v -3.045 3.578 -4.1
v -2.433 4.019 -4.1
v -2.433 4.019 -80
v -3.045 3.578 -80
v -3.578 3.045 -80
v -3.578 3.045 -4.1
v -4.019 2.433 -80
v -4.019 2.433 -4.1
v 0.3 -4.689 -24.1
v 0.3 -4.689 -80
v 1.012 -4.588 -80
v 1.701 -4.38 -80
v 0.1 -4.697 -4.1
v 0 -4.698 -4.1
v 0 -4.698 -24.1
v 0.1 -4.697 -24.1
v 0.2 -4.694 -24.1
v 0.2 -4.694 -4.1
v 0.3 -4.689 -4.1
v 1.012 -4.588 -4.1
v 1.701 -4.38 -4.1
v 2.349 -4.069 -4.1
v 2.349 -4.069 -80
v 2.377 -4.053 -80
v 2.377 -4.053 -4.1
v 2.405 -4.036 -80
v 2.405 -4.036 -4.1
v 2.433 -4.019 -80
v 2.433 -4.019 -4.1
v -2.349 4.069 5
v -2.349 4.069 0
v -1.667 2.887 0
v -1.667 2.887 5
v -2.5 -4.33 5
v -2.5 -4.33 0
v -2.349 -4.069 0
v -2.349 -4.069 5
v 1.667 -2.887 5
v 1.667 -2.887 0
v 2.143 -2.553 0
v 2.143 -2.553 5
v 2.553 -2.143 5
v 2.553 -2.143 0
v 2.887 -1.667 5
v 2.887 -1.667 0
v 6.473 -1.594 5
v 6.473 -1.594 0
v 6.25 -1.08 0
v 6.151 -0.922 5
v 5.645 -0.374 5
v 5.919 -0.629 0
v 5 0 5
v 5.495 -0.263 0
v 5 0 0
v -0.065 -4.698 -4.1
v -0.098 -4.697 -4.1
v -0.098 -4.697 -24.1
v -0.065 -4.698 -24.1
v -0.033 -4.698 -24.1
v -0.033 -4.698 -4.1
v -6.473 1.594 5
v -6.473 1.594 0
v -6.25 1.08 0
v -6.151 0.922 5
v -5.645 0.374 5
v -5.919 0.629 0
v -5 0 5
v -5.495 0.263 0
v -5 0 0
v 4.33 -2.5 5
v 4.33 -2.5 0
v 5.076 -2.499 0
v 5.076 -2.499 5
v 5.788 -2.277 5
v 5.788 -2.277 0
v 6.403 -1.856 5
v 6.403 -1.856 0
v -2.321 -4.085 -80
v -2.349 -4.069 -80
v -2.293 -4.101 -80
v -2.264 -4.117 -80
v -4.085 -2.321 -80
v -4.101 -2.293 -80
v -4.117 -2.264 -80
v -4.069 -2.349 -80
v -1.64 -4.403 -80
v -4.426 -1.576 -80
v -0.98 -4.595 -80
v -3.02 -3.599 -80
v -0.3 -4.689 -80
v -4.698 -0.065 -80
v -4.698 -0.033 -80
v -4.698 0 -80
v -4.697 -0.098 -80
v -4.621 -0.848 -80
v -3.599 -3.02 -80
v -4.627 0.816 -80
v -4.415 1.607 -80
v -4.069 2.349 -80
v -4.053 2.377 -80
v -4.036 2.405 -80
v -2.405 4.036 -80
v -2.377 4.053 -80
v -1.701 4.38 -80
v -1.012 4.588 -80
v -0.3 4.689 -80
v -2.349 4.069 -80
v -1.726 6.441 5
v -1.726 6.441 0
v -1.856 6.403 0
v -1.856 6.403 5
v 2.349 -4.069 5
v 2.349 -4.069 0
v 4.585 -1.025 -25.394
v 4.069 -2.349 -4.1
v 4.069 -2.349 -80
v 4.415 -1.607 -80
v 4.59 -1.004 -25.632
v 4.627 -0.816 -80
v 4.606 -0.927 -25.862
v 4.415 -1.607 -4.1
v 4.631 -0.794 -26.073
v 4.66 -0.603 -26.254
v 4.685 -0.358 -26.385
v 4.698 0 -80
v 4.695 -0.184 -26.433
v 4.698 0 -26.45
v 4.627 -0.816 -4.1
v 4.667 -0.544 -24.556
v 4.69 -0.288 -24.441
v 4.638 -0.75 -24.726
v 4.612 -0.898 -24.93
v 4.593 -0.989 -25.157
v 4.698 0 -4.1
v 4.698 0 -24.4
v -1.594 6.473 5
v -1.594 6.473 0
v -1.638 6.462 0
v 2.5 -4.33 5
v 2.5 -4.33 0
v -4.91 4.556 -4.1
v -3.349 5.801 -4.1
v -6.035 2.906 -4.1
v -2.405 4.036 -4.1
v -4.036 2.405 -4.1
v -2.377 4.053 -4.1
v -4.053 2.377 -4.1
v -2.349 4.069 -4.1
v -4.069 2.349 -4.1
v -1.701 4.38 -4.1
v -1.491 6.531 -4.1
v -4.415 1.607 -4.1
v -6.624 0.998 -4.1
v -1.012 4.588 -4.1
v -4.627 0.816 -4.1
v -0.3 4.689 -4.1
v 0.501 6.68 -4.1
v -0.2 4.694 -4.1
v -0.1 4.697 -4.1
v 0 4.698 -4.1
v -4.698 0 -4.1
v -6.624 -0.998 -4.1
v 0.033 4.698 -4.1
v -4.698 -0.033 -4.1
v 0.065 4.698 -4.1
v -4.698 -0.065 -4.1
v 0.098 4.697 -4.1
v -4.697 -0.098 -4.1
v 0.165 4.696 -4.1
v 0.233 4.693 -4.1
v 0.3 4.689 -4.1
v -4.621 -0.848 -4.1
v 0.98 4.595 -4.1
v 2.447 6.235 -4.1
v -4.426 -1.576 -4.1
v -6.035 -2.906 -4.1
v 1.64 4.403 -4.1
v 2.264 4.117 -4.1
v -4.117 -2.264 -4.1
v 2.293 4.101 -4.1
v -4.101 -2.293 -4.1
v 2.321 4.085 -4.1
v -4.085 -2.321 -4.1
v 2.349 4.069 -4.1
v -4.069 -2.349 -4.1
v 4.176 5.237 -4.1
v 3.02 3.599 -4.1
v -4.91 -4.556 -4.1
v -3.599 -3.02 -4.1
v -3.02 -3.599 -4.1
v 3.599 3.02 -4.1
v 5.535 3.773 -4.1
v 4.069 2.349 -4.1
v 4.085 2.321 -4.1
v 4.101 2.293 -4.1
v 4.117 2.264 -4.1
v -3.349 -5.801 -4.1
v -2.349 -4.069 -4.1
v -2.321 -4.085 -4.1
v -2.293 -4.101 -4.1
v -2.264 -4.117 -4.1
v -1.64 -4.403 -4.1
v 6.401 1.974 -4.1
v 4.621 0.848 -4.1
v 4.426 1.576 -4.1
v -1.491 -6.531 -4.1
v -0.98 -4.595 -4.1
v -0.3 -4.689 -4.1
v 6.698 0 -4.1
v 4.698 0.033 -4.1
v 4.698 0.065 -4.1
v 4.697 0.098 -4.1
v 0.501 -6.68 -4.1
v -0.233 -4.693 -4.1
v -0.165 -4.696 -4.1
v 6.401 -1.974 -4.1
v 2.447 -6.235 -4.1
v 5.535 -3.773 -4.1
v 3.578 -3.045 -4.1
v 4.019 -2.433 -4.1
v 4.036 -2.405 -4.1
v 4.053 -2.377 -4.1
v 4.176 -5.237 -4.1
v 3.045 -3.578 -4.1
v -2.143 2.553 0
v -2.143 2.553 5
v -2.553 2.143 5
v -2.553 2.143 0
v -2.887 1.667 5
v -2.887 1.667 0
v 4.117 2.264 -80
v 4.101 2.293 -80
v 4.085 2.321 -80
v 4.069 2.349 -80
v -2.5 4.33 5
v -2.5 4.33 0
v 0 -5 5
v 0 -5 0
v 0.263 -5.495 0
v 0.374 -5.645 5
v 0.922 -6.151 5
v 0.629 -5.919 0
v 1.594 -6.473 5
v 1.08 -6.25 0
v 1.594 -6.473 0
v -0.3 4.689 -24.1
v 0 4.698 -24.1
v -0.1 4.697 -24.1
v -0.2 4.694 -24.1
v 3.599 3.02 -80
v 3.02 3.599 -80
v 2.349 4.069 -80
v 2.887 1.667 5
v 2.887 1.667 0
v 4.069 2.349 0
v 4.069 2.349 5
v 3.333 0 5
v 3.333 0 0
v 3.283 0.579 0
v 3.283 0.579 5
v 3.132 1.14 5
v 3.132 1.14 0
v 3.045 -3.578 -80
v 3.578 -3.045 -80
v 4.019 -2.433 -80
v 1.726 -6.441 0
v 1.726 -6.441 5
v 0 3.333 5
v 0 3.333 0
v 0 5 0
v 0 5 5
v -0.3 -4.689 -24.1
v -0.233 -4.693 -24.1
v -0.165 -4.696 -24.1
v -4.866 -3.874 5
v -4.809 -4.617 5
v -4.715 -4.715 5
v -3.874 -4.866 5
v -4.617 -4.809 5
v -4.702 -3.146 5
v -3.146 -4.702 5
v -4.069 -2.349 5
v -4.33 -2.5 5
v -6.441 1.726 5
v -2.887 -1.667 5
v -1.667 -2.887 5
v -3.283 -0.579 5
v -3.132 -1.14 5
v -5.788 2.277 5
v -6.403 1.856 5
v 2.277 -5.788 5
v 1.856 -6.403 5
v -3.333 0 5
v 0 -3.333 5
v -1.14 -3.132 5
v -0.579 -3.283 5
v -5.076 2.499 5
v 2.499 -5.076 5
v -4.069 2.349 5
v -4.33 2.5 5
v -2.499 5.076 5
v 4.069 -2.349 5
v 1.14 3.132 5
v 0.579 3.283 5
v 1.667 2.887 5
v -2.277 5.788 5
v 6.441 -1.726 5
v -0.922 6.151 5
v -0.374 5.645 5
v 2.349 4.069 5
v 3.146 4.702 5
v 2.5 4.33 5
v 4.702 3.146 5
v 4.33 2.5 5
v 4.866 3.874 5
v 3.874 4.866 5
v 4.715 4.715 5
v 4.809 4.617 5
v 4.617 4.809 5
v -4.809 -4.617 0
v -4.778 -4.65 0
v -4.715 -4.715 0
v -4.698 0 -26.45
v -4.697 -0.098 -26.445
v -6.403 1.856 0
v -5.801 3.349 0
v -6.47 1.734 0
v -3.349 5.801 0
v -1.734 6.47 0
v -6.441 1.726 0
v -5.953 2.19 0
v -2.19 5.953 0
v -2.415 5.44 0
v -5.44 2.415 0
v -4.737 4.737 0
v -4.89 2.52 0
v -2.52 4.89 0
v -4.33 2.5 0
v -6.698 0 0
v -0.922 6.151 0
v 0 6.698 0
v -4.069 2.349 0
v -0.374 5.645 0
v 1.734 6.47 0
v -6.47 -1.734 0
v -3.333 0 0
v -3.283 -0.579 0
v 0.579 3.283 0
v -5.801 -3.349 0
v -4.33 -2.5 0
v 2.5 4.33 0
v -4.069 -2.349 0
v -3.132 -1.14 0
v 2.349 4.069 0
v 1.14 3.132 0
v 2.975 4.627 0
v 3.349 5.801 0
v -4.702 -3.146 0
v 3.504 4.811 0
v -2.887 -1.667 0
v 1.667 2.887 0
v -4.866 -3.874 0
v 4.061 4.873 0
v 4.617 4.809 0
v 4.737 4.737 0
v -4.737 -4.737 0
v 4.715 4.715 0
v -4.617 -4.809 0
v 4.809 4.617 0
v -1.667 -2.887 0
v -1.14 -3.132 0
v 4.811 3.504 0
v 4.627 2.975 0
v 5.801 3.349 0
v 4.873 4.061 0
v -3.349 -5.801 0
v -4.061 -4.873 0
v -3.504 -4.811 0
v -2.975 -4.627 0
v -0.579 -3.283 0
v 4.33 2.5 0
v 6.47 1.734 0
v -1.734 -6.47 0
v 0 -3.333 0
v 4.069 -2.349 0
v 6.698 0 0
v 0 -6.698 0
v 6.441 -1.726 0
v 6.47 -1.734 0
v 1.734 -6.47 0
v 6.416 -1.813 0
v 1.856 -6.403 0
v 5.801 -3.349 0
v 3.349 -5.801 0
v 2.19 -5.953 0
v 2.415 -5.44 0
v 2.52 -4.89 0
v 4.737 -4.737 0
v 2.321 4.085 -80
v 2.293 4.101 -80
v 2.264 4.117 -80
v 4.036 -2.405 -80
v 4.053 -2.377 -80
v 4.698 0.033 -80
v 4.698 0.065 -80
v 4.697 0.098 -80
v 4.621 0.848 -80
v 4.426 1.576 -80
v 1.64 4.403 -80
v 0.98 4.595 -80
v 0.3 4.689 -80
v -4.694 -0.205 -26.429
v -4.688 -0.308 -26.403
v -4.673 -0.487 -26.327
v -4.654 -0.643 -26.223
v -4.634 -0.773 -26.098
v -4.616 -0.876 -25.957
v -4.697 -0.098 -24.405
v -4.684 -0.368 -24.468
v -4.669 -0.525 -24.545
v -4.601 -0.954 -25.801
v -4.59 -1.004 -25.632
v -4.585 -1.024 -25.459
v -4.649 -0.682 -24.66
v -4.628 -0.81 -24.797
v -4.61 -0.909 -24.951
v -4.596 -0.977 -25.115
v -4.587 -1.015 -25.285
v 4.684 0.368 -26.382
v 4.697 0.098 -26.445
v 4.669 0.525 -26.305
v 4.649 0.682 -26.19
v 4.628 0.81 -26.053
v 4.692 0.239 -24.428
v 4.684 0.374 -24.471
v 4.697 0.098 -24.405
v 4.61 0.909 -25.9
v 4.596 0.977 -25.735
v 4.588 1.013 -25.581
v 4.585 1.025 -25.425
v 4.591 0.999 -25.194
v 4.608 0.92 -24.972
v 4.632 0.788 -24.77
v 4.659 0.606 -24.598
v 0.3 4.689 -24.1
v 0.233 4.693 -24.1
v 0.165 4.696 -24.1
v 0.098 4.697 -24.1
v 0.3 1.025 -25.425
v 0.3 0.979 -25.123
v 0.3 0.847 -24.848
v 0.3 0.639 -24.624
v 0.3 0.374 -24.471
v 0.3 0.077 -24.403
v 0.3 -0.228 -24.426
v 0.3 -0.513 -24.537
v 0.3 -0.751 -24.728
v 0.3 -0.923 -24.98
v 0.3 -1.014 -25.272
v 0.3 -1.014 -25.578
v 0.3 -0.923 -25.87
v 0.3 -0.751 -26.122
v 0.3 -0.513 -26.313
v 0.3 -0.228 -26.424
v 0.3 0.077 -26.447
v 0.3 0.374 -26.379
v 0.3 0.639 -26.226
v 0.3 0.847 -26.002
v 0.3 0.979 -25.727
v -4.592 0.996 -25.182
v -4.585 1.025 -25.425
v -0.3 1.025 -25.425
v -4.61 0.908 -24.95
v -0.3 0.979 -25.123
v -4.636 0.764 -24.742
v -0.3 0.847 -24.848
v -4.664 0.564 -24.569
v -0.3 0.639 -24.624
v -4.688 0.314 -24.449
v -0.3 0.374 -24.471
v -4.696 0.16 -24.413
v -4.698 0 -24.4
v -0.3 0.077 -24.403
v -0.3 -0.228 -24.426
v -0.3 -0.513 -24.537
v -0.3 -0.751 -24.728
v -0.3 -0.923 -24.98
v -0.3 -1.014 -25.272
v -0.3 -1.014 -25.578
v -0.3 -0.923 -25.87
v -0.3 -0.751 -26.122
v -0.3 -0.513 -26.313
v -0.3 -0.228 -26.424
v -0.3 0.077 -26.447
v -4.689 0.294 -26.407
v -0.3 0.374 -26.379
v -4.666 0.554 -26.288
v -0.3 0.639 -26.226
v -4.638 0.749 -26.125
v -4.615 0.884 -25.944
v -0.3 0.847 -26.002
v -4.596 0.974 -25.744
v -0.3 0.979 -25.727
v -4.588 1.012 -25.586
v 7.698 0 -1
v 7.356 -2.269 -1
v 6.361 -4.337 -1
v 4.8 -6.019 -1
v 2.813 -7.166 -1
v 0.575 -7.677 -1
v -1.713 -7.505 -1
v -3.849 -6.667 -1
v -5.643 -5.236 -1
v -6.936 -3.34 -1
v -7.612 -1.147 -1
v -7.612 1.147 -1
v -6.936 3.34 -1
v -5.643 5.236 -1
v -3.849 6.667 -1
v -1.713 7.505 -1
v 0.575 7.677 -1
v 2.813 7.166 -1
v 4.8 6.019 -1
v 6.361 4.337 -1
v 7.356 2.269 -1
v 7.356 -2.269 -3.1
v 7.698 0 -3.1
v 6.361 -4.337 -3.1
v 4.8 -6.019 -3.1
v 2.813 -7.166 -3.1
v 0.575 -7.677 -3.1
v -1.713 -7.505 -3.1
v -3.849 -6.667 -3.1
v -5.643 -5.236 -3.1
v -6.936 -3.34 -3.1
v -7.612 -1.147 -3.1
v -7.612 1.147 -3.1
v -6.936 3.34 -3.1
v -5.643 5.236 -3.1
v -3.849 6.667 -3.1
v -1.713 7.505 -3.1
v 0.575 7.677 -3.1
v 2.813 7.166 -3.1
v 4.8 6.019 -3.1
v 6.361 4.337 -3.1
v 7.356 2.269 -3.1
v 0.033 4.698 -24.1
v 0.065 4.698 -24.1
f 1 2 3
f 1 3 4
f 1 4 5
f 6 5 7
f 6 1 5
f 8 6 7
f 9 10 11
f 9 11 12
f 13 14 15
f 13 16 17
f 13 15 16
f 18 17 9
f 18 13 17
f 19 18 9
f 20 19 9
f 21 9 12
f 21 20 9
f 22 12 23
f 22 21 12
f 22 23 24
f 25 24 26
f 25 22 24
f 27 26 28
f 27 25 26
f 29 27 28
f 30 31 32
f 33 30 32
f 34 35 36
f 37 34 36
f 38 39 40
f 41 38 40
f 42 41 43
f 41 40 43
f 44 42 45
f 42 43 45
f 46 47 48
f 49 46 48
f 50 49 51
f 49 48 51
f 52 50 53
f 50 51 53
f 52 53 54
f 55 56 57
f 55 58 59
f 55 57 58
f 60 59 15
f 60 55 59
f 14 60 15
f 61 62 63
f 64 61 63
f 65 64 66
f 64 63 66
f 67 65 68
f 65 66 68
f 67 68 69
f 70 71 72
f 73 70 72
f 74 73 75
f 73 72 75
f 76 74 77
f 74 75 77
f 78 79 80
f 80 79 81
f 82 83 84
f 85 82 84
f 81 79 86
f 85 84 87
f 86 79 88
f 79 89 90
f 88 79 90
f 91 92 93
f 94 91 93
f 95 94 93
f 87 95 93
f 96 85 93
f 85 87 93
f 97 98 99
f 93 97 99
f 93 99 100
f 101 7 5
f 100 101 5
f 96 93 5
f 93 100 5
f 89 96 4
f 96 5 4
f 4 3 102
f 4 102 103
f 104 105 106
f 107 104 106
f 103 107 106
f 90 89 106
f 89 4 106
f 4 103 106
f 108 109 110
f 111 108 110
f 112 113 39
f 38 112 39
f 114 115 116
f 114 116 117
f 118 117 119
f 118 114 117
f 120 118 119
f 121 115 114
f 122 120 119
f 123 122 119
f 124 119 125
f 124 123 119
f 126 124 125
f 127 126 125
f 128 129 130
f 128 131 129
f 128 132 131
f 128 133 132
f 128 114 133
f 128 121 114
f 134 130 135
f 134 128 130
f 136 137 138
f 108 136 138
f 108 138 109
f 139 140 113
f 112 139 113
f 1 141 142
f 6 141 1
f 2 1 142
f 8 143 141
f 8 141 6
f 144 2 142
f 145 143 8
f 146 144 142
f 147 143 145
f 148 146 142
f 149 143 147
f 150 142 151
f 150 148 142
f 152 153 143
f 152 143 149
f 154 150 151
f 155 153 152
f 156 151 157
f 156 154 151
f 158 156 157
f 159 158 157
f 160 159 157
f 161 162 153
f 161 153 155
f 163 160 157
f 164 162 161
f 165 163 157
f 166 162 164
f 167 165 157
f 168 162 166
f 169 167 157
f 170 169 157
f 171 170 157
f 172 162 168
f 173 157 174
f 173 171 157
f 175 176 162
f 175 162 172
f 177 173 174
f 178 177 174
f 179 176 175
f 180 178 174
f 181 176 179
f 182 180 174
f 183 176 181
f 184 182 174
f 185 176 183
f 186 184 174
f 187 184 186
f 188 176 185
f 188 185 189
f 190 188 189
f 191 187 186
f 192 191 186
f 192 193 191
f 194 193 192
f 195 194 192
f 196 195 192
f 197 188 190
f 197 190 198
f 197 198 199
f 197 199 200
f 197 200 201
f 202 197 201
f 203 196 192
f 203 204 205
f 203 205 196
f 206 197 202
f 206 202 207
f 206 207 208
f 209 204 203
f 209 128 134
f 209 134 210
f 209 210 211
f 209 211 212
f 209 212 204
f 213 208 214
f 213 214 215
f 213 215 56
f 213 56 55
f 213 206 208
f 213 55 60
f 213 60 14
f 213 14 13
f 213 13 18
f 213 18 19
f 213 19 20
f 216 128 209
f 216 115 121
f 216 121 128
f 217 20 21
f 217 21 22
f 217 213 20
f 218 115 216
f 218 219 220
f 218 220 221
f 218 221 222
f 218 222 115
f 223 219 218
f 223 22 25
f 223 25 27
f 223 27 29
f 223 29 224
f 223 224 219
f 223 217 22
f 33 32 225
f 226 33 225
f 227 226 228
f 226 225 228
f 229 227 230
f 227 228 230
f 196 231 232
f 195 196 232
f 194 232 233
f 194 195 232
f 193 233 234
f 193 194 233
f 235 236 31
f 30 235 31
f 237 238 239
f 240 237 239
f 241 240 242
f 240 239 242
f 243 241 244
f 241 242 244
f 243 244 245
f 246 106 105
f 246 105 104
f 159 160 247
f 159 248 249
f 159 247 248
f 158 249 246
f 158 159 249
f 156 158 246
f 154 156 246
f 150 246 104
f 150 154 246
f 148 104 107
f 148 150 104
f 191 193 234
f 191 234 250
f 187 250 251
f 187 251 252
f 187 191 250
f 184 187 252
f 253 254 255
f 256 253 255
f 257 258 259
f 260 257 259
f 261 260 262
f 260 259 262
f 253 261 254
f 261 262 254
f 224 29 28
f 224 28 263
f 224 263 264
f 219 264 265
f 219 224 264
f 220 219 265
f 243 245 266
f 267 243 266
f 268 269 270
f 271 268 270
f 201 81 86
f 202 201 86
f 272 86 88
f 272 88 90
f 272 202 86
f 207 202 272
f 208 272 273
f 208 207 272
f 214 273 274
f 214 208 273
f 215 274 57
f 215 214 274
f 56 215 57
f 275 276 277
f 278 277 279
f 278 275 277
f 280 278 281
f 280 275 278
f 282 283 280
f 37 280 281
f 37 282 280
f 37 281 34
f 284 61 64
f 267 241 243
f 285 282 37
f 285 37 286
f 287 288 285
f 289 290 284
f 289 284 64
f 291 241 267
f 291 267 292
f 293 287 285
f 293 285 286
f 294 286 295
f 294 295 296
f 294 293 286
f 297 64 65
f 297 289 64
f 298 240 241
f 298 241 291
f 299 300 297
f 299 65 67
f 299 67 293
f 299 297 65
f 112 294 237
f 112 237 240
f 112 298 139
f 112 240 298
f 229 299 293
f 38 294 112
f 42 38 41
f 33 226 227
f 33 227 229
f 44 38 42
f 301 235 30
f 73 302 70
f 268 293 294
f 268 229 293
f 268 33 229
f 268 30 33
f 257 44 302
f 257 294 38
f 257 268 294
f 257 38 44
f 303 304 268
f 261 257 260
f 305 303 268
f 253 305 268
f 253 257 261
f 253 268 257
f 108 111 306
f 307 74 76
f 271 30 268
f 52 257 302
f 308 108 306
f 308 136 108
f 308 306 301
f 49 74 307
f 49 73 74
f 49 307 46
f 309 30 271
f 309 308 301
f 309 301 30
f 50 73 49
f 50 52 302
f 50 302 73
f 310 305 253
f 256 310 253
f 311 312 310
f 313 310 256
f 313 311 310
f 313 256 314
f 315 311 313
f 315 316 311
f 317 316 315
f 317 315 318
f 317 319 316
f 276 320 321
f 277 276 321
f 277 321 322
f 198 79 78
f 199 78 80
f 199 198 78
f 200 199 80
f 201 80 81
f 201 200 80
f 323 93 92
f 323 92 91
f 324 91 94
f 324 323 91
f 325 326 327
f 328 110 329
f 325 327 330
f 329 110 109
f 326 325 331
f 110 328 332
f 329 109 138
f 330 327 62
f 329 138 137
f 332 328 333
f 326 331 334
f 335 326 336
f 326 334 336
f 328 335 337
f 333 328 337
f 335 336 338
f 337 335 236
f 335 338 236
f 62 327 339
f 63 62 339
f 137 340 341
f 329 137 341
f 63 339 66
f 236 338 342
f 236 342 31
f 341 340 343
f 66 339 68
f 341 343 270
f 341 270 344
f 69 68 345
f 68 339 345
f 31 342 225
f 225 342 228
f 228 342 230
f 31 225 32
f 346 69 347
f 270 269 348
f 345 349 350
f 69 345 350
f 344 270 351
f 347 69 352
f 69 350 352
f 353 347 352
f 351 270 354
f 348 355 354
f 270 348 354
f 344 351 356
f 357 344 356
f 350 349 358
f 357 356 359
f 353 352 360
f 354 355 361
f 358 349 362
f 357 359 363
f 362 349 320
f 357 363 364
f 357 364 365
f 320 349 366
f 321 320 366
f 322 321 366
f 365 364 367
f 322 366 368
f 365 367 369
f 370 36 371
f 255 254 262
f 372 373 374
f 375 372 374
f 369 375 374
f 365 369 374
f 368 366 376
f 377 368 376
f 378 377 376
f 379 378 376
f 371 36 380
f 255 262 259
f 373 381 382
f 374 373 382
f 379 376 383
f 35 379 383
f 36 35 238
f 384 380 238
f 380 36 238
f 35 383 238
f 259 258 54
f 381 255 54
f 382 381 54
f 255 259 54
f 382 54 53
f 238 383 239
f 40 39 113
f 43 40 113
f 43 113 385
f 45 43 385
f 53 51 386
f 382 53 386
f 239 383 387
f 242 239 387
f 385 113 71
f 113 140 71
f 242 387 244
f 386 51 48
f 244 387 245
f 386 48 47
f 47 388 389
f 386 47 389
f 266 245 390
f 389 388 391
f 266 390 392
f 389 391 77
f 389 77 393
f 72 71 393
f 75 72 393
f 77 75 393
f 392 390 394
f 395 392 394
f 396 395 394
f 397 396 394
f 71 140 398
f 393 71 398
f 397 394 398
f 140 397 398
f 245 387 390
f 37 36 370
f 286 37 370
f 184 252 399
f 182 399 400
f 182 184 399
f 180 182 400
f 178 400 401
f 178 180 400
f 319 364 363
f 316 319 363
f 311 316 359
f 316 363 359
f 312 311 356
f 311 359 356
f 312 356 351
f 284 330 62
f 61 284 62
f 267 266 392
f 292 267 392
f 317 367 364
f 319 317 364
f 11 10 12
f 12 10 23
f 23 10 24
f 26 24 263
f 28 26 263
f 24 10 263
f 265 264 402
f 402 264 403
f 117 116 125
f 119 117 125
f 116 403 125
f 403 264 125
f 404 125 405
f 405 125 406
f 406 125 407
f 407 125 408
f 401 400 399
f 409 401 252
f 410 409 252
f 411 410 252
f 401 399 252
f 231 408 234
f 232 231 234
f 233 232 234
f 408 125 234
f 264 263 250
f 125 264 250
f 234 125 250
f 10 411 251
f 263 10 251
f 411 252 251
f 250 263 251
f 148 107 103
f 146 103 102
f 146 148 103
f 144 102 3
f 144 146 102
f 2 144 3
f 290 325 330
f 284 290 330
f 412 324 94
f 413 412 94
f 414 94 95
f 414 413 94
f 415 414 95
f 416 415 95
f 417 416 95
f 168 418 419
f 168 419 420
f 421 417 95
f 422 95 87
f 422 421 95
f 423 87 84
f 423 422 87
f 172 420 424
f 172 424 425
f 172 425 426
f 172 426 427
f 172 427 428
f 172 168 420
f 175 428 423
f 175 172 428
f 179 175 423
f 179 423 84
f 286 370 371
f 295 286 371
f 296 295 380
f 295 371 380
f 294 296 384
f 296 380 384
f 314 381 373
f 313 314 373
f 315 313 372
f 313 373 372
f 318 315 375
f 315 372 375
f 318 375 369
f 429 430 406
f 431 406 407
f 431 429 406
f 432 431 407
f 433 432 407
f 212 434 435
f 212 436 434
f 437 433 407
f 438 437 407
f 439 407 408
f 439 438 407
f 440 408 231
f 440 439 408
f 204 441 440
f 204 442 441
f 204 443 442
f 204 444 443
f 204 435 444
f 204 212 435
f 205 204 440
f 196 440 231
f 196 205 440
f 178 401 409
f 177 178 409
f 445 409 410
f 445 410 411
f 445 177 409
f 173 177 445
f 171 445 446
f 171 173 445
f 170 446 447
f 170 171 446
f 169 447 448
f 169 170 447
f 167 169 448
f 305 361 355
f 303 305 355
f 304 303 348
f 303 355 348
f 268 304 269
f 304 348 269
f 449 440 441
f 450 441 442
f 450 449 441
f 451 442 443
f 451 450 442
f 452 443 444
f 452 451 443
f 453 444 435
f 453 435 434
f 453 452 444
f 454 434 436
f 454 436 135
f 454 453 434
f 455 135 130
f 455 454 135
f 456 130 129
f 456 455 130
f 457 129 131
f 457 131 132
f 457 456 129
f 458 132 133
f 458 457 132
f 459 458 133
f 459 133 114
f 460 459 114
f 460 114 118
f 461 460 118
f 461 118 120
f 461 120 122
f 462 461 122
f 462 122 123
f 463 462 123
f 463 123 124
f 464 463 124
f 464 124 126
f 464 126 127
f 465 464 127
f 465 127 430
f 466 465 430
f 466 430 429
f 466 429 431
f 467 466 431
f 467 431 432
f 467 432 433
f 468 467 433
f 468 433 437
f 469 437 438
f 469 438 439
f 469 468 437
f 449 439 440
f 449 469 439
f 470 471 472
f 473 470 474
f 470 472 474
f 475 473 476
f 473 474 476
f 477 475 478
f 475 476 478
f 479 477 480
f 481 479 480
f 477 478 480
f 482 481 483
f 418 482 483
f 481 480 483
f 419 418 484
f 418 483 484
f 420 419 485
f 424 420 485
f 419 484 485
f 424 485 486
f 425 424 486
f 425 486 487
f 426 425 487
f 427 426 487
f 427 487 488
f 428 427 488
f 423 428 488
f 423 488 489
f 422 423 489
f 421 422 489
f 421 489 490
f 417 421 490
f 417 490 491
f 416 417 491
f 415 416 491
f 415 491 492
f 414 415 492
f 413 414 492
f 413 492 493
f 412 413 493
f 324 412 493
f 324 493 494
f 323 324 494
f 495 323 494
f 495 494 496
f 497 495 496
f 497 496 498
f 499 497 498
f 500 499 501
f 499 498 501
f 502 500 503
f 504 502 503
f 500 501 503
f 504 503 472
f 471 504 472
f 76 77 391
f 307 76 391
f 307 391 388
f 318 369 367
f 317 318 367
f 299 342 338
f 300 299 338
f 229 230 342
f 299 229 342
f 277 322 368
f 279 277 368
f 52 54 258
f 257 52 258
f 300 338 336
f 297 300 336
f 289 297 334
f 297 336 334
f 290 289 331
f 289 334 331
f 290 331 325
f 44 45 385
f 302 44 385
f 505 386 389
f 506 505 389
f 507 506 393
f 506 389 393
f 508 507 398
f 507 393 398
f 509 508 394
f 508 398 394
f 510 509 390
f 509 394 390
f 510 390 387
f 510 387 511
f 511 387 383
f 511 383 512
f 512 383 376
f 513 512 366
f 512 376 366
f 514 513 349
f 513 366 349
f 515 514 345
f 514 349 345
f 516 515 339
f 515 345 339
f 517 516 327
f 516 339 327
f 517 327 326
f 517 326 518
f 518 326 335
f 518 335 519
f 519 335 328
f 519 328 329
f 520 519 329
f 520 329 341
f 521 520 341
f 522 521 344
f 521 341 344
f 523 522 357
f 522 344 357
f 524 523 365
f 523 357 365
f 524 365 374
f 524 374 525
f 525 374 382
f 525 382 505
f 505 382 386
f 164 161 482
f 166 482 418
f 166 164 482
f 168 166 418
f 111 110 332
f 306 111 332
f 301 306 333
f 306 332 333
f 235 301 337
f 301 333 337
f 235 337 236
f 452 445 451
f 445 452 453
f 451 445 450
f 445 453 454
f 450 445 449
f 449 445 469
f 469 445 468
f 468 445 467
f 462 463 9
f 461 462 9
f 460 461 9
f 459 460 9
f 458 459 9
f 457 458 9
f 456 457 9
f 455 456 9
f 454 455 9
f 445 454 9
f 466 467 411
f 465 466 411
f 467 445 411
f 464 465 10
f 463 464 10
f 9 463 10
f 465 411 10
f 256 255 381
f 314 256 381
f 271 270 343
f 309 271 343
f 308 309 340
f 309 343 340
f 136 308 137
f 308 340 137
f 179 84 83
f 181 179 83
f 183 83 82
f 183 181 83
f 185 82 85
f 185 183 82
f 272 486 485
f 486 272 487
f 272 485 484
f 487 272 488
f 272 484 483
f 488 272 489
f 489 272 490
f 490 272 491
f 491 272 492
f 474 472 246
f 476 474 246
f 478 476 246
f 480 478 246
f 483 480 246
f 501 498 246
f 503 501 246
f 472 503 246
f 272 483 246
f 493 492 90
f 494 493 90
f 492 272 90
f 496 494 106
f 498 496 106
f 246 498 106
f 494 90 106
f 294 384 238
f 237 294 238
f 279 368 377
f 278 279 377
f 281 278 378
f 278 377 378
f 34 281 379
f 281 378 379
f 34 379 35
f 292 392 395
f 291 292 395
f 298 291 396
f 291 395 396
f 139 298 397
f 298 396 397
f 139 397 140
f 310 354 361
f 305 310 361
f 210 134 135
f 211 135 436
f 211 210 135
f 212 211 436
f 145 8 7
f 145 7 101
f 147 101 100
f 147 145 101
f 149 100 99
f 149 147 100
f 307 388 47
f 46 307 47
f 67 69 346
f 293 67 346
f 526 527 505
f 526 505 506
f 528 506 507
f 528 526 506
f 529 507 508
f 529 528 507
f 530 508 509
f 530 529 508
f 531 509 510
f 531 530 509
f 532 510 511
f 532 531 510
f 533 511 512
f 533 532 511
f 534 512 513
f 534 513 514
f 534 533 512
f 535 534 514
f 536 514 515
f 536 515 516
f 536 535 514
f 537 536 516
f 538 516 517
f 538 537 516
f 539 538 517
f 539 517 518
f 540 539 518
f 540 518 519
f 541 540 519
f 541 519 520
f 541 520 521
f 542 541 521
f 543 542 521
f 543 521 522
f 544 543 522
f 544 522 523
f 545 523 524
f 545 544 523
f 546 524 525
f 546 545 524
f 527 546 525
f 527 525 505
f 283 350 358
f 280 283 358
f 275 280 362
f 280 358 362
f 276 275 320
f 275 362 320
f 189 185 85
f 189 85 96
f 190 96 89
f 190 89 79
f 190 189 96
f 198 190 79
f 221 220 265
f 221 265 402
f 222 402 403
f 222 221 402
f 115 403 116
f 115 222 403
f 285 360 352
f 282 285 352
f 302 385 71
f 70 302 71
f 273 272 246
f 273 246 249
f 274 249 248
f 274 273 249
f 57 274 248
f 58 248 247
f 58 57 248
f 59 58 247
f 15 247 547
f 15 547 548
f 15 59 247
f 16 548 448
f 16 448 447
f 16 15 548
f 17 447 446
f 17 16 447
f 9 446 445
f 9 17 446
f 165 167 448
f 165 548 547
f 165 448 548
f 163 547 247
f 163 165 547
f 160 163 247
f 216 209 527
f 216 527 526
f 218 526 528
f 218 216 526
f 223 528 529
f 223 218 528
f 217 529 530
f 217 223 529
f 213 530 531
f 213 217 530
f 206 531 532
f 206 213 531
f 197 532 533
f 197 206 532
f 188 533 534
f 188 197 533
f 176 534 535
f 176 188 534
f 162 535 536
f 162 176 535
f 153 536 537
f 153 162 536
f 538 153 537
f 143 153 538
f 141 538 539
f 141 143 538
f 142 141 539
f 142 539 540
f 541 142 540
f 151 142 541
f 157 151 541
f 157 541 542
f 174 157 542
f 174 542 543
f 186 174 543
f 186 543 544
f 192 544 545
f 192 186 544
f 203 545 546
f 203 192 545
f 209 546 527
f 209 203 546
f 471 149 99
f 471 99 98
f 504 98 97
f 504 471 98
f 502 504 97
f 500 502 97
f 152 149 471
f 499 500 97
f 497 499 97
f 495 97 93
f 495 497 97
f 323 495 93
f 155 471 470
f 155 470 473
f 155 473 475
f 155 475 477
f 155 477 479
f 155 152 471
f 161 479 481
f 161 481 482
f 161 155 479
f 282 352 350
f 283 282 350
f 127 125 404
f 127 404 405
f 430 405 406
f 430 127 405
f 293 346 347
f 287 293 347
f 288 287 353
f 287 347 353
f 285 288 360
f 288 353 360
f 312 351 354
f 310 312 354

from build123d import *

# Parameters (mm, degrees)
F6_DEPTH       = 5
F7_DEPTH       = 80
F9_START       = -75.9
F8_R           = 7.6984631039
F9_DEPTH       = 4.1
F10_SIZE       = 1
F11_DEPTH      = 55.9
F12_R          = 1.025
F13_DEPTH      = 7.6994631039
F13_DEPTH_BACK = 7.6994631039


# Not quite as in the source:
# - a feature names something its author has since deleted; it is built from what else it names


with BuildPart() as f6:
    # F5 (on Top) → F6 (new body)
    with BuildSketch(Plane.XY):
        with BuildLine():
            Line((-4.0689884067, 2.349231552), (-4.3301270189, 2.5))
            ThreePointArc((-4.3301270189, 2.5), (-4.8296291314, 1.2940952255), (-5, 0))
            Line((-5, 0), (-4.6984631039, 0))
            ThreePointArc((-4.6984631039, 0), (-4.538366856, 1.216051734), (-4.0689884067, 2.349231552))
        make_face()
        with BuildLine():
            Line((-2.8867513459, 1.6666666667), (-4.0689884067, 2.349231552))
            ThreePointArc((-4.0689884067, 2.349231552), (-4.538366856, 1.216051734), (-4.6984631039, 0))
            Line((-4.6984631039, 0), (-3.3333333333, 0))
            ThreePointArc((-3.3333333333, 0), (-3.2197527543, 0.8627301503), (-2.8867513459, 1.6666666667))
        make_face()
        with BuildLine():
            ThreePointArc((-2.5, 4.3301270189), (-1.2940952255, 4.8296291314), (0, 5))
            ThreePointArc((0, 5), (-0.6289197853, 5.9186828799), (-1.5943250641, 6.4732196035))
            Line((-1.5943250641, 6.4732196035), (-1.7258162456, 6.440833913))
            Line((-1.7258162456, 6.440833913), (-1.8558837944, 6.4031351529))
            ThreePointArc((-1.8558837944, 6.4031351529), (-2.414680929, 5.4401896236), (-2.5, 4.3301270189))
        make_face()
        with BuildLine():
            ThreePointArc((2.8867513459, -1.6666666667), (3.2197527543, -0.8627301503), (3.3333333333, 0))
            ThreePointArc((3.3333333333, 0), (3.2197527543, 0.8627301503), (2.8867513459, 1.6666666667))
            ThreePointArc((2.8867513459, 1.6666666667), (2.357022604, 2.357022604), (1.6666666667, 2.8867513459))
            ThreePointArc((1.6666666667, 2.8867513459), (0.8627301503, 3.2197527543), (0, 3.3333333333))
            ThreePointArc((0, 3.3333333333), (-0.8627301503, 3.2197527543), (-1.6666666667, 2.8867513459))
            ThreePointArc((-1.6666666667, 2.8867513459), (-2.357022604, 2.357022604), (-2.8867513459, 1.6666666667))
            ThreePointArc((-2.8867513459, 1.6666666667), (-3.2197527543, 0.8627301503), (-3.3333333333, 0))
            ThreePointArc((-3.3333333333, 0), (-3.2197527543, -0.8627301503), (-2.8867513459, -1.6666666667))
            ThreePointArc((-2.8867513459, -1.6666666667), (-2.357022604, -2.357022604), (-1.6666666667, -2.8867513459))
            ThreePointArc((-1.6666666667, -2.8867513459), (-0.8627301503, -3.2197527543), (0, -3.3333333333))
            ThreePointArc((0, -3.3333333333), (0.8627301503, -3.2197527543), (1.6666666667, -2.8867513459))
            ThreePointArc((1.6666666667, -2.8867513459), (2.357022604, -2.357022604), (2.8867513459, -1.6666666667))
        make_face()
        with BuildLine():
            Line((4.0689884067, 2.349231552), (4.3301270189, 2.5))
            ThreePointArc((4.3301270189, 2.5), (3.5355339059, 3.5355339059), (2.5, 4.3301270189))
            Line((2.5, 4.3301270189), (2.349231552, 4.0689884067))
            ThreePointArc((2.349231552, 4.0689884067), (3.3223151219, 3.3223151219), (4.0689884067, 2.349231552))
        make_face()
        with BuildLine():
            Line((2.8867513459, 1.6666666667), (4.0689884067, 2.349231552))
            ThreePointArc((4.0689884067, 2.349231552), (3.3223151219, 3.3223151219), (2.349231552, 4.0689884067))
            Line((2.349231552, 4.0689884067), (1.6666666667, 2.8867513459))
            ThreePointArc((1.6666666667, 2.8867513459), (2.357022604, 2.357022604), (2.8867513459, 1.6666666667))
        make_face()
        with BuildLine():
            ThreePointArc((4.3301270189, -2.5), (4.8296291314, -1.2940952255), (5, 0))
            Line((5, 0), (4.6984631039, 0))
            ThreePointArc((4.6984631039, 0), (4.538366856, -1.216051734), (4.0689884067, -2.349231552))
            Line((4.0689884067, -2.349231552), (4.3301270189, -2.5))
        make_face()
        with BuildLine():
            ThreePointArc((4.0689884067, -2.349231552), (4.538366856, -1.216051734), (4.6984631039, 0))
            Line((4.6984631039, 0), (3.3333333333, 0))
            ThreePointArc((3.3333333333, 0), (3.2197527543, -0.8627301503), (2.8867513459, -1.6666666667))
            Line((2.8867513459, -1.6666666667), (4.0689884067, -2.349231552))
        make_face()
        with BuildLine():
            ThreePointArc((0, -5), (1.2940952255, -4.8296291314), (2.5, -4.3301270189))
            Line((2.5, -4.3301270189), (2.349231552, -4.0689884067))
            ThreePointArc((2.349231552, -4.0689884067), (1.216051734, -4.538366856), (0, -4.6984631039))
            Line((0, -4.6984631039), (0, -5))
        make_face()
        with BuildLine():
            ThreePointArc((0, -4.6984631039), (1.216051734, -4.538366856), (2.349231552, -4.0689884067))
            Line((2.349231552, -4.0689884067), (1.6666666667, -2.8867513459))
            ThreePointArc((1.6666666667, -2.8867513459), (0.8627301503, -3.2197527543), (0, -3.3333333333))
            Line((0, -3.3333333333), (0, -4.6984631039))
        make_face()
        with BuildLine():
            ThreePointArc((-4.3301270189, -2.5), (-3.5355339059, -3.5355339059), (-2.5, -4.3301270189))
            Line((-2.5, -4.3301270189), (-2.349231552, -4.0689884067))
            ThreePointArc((-2.349231552, -4.0689884067), (-3.3223151219, -3.3223151219), (-4.0689884067, -2.349231552))
            Line((-4.0689884067, -2.349231552), (-4.3301270189, -2.5))
        make_face()
        with BuildLine():
            ThreePointArc((-4.0689884067, -2.349231552), (-3.3223151219, -3.3223151219), (-2.349231552, -4.0689884067))
            Line((-2.349231552, -4.0689884067), (-1.6666666667, -2.8867513459))
            ThreePointArc((-1.6666666667, -2.8867513459), (-2.357022604, -2.357022604), (-2.8867513459, -1.6666666667))
            Line((-2.8867513459, -1.6666666667), (-4.0689884067, -2.349231552))
        make_face()
        with BuildLine():
            Line((0, 4.6984631039), (0, 5))
            ThreePointArc((0, 5), (-1.2940952255, 4.8296291314), (-2.5, 4.3301270189))
            Line((-2.5, 4.3301270189), (-2.349231552, 4.0689884067))
            ThreePointArc((-2.349231552, 4.0689884067), (-1.216051734, 4.538366856), (0, 4.6984631039))
        make_face()
        with BuildLine():
            Line((0, 3.3333333333), (0, 4.6984631039))
            ThreePointArc((0, 4.6984631039), (-1.216051734, 4.538366856), (-2.349231552, 4.0689884067))
            Line((-2.349231552, 4.0689884067), (-1.6666666667, 2.8867513459))
            ThreePointArc((-1.6666666667, 2.8867513459), (-0.8627301503, 3.2197527543), (0, 3.3333333333))
        make_face()
        with BuildLine():
            ThreePointArc((-5, 0), (-4.8296291314, 1.2940952255), (-4.3301270189, 2.5))
            ThreePointArc((-4.3301270189, 2.5), (-5.4401896236, 2.414680929), (-6.4031351529, 1.8558837944))
            Line((-6.4031351529, 1.8558837944), (-6.440833913, 1.7258162456))
            Line((-6.440833913, 1.7258162456), (-6.4732196035, 1.5943250641))
            ThreePointArc((-6.4732196035, 1.5943250641), (-5.9186828799, 0.6289197853), (-5, 0))
        make_face()
        with BuildLine():
            ThreePointArc((-4.6173358091, -4.8088100888), (-3.5040019509, -4.8112698383), (-2.5, -4.3301270189))
            ThreePointArc((-2.5, -4.3301270189), (-3.5355339059, -3.5355339059), (-4.3301270189, -2.5))
            ThreePointArc((-4.3301270189, -2.5), (-4.8112698383, -3.5040019509), (-4.8088100888, -4.6173358091))
            Line((-4.8088100888, -4.6173358091), (-4.7150176674, -4.7150176674))
            Line((-4.7150176674, -4.7150176674), (-4.6173358091, -4.8088100888))
        make_face()
        with BuildLine():
            ThreePointArc((1.8558837944, -6.4031351529), (2.414680929, -5.4401896236), (2.5, -4.3301270189))
            ThreePointArc((2.5, -4.3301270189), (1.2940952255, -4.8296291314), (0, -5))
            ThreePointArc((0, -5), (0.6289197853, -5.9186828799), (1.5943250641, -6.4732196035))
            Line((1.5943250641, -6.4732196035), (1.7258162456, -6.440833913))
            Line((1.7258162456, -6.440833913), (1.8558837944, -6.4031351529))
        make_face()
        with BuildLine():
            ThreePointArc((6.4732196035, -1.5943250641), (5.9186828799, -0.6289197853), (5, 0))
            ThreePointArc((5, 0), (4.8296291314, -1.2940952255), (4.3301270189, -2.5))
            ThreePointArc((4.3301270189, -2.5), (5.4401896236, -2.414680929), (6.4031351529, -1.8558837944))
            Line((6.4031351529, -1.8558837944), (6.440833913, -1.7258162456))
            Line((6.440833913, -1.7258162456), (6.4732196035, -1.5943250641))
        make_face()
        with BuildLine():
            ThreePointArc((2.5, 4.3301270189), (3.5355339059, 3.5355339059), (4.3301270189, 2.5))
            ThreePointArc((4.3301270189, 2.5), (4.8112698383, 3.5040019509), (4.8088100888, 4.6173358091))
            Line((4.8088100888, 4.6173358091), (4.7150176674, 4.7150176674))
            Line((4.7150176674, 4.7150176674), (4.6173358091, 4.8088100888))
            ThreePointArc((4.6173358091, 4.8088100888), (3.5040019509, 4.8112698383), (2.5, 4.3301270189))
        make_face()
    extrude(amount=F6_DEPTH)

    # F5 (on Top) → F7 (join)
    with BuildSketch(Plane.XY):
        with BuildLine():
            ThreePointArc((2.8867513459, -1.6666666667), (3.2197527543, -0.8627301503), (3.3333333333, 0))
            ThreePointArc((3.3333333333, 0), (3.2197527543, 0.8627301503), (2.8867513459, 1.6666666667))
            ThreePointArc((2.8867513459, 1.6666666667), (2.357022604, 2.357022604), (1.6666666667, 2.8867513459))
            ThreePointArc((1.6666666667, 2.8867513459), (0.8627301503, 3.2197527543), (0, 3.3333333333))
            ThreePointArc((0, 3.3333333333), (-0.8627301503, 3.2197527543), (-1.6666666667, 2.8867513459))
            ThreePointArc((-1.6666666667, 2.8867513459), (-2.357022604, 2.357022604), (-2.8867513459, 1.6666666667))
            ThreePointArc((-2.8867513459, 1.6666666667), (-3.2197527543, 0.8627301503), (-3.3333333333, 0))
            ThreePointArc((-3.3333333333, 0), (-3.2197527543, -0.8627301503), (-2.8867513459, -1.6666666667))
            ThreePointArc((-2.8867513459, -1.6666666667), (-2.357022604, -2.357022604), (-1.6666666667, -2.8867513459))
            ThreePointArc((-1.6666666667, -2.8867513459), (-0.8627301503, -3.2197527543), (0, -3.3333333333))
            ThreePointArc((0, -3.3333333333), (0.8627301503, -3.2197527543), (1.6666666667, -2.8867513459))
            ThreePointArc((1.6666666667, -2.8867513459), (2.357022604, -2.357022604), (2.8867513459, -1.6666666667))
        make_face()
        with BuildLine():
            ThreePointArc((-4.1169236265, -2.2641765374), (-4.0931769499, -2.306828558), (-4.0689884067, -2.349231552))
            Line((-4.0689884067, -2.349231552), (-2.8867513459, -1.6666666667))
            ThreePointArc((-2.8867513459, -1.6666666667), (-3.2197527543, -0.8627301503), (-3.3333333333, 0))
            Line((-3.3333333333, 0), (-4.6984631039, 0))
            ThreePointArc((-4.6984631039, 0), (-4.6982094998, -0.0488163415), (-4.6974487147, -0.0976274132))
            ThreePointArc((-4.6974487147, -0.0976274132), (-4.538366856, -1.216051734), (-4.1169236265, -2.2641765374))
        make_face()
        with BuildLine():
            Line((-2.8867513459, 1.6666666667), (-4.0689884067, 2.349231552))
            ThreePointArc((-4.0689884067, 2.349231552), (-4.538366856, 1.216051734), (-4.6984631039, 0))
            Line((-4.6984631039, 0), (-3.3333333333, 0))
            ThreePointArc((-3.3333333333, 0), (-3.2197527543, 0.8627301503), (-2.8867513459, 1.6666666667))
        make_face()
        with BuildLine():
            ThreePointArc((-2.349231552, 4.0689884067), (-2.3913809418, 4.0443606083), (-2.4332721773, 4.0192962133))
            ThreePointArc((-2.4332721773, 4.0192962133), (-3.3223151219, 3.3223151219), (-4.0192962133, 2.4332721773))
            ThreePointArc((-4.0192962133, 2.4332721773), (-4.0443606083, 2.3913809418), (-4.0689884067, 2.349231552))
            Line((-4.0689884067, 2.349231552), (-2.8867513459, 1.6666666667))
            ThreePointArc((-2.8867513459, 1.6666666667), (-2.357022604, 2.357022604), (-1.6666666667, 2.8867513459))
            Line((-1.6666666667, 2.8867513459), (-2.349231552, 4.0689884067))
        make_face()
        with BuildLine():
            Line((0, 3.3333333333), (0, 4.6984631039))
            ThreePointArc((0, 4.6984631039), (-1.216051734, 4.538366856), (-2.349231552, 4.0689884067))
            Line((-2.349231552, 4.0689884067), (-1.6666666667, 2.8867513459))
            ThreePointArc((-1.6666666667, 2.8867513459), (-0.8627301503, 3.2197527543), (0, 3.3333333333))
        make_face()
        with BuildLine():
            ThreePointArc((2.349231552, 4.0689884067), (2.306828558, 4.0931769499), (2.2641765374, 4.1169236265))
            ThreePointArc((2.2641765374, 4.1169236265), (1.216051734, 4.538366856), (0.0976274132, 4.6974487147))
            ThreePointArc((0.0976274132, 4.6974487147), (0.0488163415, 4.6982094998), (0, 4.6984631039))
            Line((0, 4.6984631039), (0, 3.3333333333))
            ThreePointArc((0, 3.3333333333), (0.8627301503, 3.2197527543), (1.6666666667, 2.8867513459))
            Line((1.6666666667, 2.8867513459), (2.349231552, 4.0689884067))
        make_face()
        with BuildLine():
            Line((2.8867513459, 1.6666666667), (4.0689884067, 2.349231552))
            ThreePointArc((4.0689884067, 2.349231552), (3.3223151219, 3.3223151219), (2.349231552, 4.0689884067))
            Line((2.349231552, 4.0689884067), (1.6666666667, 2.8867513459))
            ThreePointArc((1.6666666667, 2.8867513459), (2.357022604, 2.357022604), (2.8867513459, 1.6666666667))
        make_face()
        with BuildLine():
            ThreePointArc((4.6984631039, 0), (4.6982094998, 0.0488163415), (4.6974487147, 0.0976274132))
            ThreePointArc((4.6974487147, 0.0976274132), (4.538366856, 1.216051734), (4.1169236265, 2.2641765374))
            ThreePointArc((4.1169236265, 2.2641765374), (4.0931769499, 2.306828558), (4.0689884067, 2.349231552))
            Line((4.0689884067, 2.349231552), (2.8867513459, 1.6666666667))
            ThreePointArc((2.8867513459, 1.6666666667), (3.2197527543, 0.8627301503), (3.3333333333, 0))
            Line((3.3333333333, 0), (4.6984631039, 0))
        make_face()
        with BuildLine():
            ThreePointArc((4.0689884067, -2.349231552), (4.538366856, -1.216051734), (4.6984631039, 0))
            Line((4.6984631039, 0), (3.3333333333, 0))
            ThreePointArc((3.3333333333, 0), (3.2197527543, -0.8627301503), (2.8867513459, -1.6666666667))
            Line((2.8867513459, -1.6666666667), (4.0689884067, -2.349231552))
        make_face()
        with BuildLine():
            ThreePointArc((4.0192962133, -2.4332721773), (4.0443606083, -2.3913809418), (4.0689884067, -2.349231552))
            Line((4.0689884067, -2.349231552), (2.8867513459, -1.6666666667))
            ThreePointArc((2.8867513459, -1.6666666667), (2.357022604, -2.357022604), (1.6666666667, -2.8867513459))
            Line((1.6666666667, -2.8867513459), (2.349231552, -4.0689884067))
            ThreePointArc((2.349231552, -4.0689884067), (2.3913809418, -4.0443606083), (2.4332721773, -4.0192962133))
            ThreePointArc((2.4332721773, -4.0192962133), (3.3223151219, -3.3223151219), (4.0192962133, -2.4332721773))
        make_face()
        with BuildLine():
            ThreePointArc((0, -4.6984631039), (1.216051734, -4.538366856), (2.349231552, -4.0689884067))
            Line((2.349231552, -4.0689884067), (1.6666666667, -2.8867513459))
            ThreePointArc((1.6666666667, -2.8867513459), (0.8627301503, -3.2197527543), (0, -3.3333333333))
            Line((0, -3.3333333333), (0, -4.6984631039))
        make_face()
        with BuildLine():
            ThreePointArc((-0.0976274132, -4.6974487147), (-0.0488163415, -4.6982094998), (0, -4.6984631039))
            Line((0, -4.6984631039), (0, -3.3333333333))
            ThreePointArc((0, -3.3333333333), (-0.8627301503, -3.2197527543), (-1.6666666667, -2.8867513459))
            Line((-1.6666666667, -2.8867513459), (-2.349231552, -4.0689884067))
            ThreePointArc((-2.349231552, -4.0689884067), (-2.306828558, -4.0931769499), (-2.2641765374, -4.1169236265))
            ThreePointArc((-2.2641765374, -4.1169236265), (-1.216051734, -4.538366856), (-0.0976274132, -4.6974487147))
        make_face()
        with BuildLine():
            ThreePointArc((-4.0689884067, -2.349231552), (-3.3223151219, -3.3223151219), (-2.349231552, -4.0689884067))
            Line((-2.349231552, -4.0689884067), (-1.6666666667, -2.8867513459))
            ThreePointArc((-1.6666666667, -2.8867513459), (-2.357022604, -2.357022604), (-2.8867513459, -1.6666666667))
            Line((-2.8867513459, -1.6666666667), (-4.0689884067, -2.349231552))
        make_face()
    extrude(amount=-F7_DEPTH)

    # F8 (on face) → F9 (join)
    with BuildSketch(Plane(origin=(0, 0, -80), x_dir=(1, 0, 0), z_dir=(0, 0, -1)).offset(F9_START)):
        Circle(F8_R)
        with BuildLine():
            ThreePointArc((-0.3, -4.6888757223), (-4.6984631039, 0), (-0.3, 4.6888757223))
            ThreePointArc((-0.3, 4.6888757223), (0, 4.6984631039), (0.3, 4.6888757223))
            ThreePointArc((0.3, 4.6888757223), (3.4267400303, 3.2144996973), (4.6984631039, 0))
            ThreePointArc((4.6984631039, 0), (3.4267400303, -3.2144996973), (0.3, -4.6888757223))
            ThreePointArc((0.3, -4.6888757223), (0, -4.6984631039), (-0.3, -4.6888757223))
        make_face(mode=Mode.SUBTRACT)
    extrude(amount=-F9_DEPTH)

    # F10
    f10_edges = [f6.edges().sort_by_distance(p)[0] for p in [
        (-7.698463, 0, 0),
        (-7.698463, 0, -4.1),
    ]]
    chamfer(f10_edges, length=F10_SIZE)

    # F8 (on face) → F11 (cut)
    with BuildSketch(Plane(origin=(0, 0, -80), x_dir=(1, 0, 0), z_dir=(0, 0, -1))):
        with BuildLine():
            ThreePointArc((0.3, 4.6888757223), (0, 4.6984631039), (-0.3, 4.6888757223))
            Line((-0.3, 4.6888757223), (-0.3, -4.6888757223))
            ThreePointArc((-0.3, -4.6888757223), (0, -4.6984631039), (0.3, -4.6888757223))
            Line((0.3, -4.6888757223), (0.3, 4.6888757223))
        make_face()
    extrude(amount=-F11_DEPTH, mode=Mode.SUBTRACT)

    # F12 (on Right) → F13 (cut, two sides)
    with BuildSketch(Plane.YZ) as f13_sk:
        with Locations((0, -25.425)):
            Circle(F12_R)
    extrude(amount=F13_DEPTH, mode=Mode.SUBTRACT)
    extrude(f13_sk.sketch, amount=-F13_DEPTH_BACK, mode=Mode.SUBTRACT)


solid = f6.part
